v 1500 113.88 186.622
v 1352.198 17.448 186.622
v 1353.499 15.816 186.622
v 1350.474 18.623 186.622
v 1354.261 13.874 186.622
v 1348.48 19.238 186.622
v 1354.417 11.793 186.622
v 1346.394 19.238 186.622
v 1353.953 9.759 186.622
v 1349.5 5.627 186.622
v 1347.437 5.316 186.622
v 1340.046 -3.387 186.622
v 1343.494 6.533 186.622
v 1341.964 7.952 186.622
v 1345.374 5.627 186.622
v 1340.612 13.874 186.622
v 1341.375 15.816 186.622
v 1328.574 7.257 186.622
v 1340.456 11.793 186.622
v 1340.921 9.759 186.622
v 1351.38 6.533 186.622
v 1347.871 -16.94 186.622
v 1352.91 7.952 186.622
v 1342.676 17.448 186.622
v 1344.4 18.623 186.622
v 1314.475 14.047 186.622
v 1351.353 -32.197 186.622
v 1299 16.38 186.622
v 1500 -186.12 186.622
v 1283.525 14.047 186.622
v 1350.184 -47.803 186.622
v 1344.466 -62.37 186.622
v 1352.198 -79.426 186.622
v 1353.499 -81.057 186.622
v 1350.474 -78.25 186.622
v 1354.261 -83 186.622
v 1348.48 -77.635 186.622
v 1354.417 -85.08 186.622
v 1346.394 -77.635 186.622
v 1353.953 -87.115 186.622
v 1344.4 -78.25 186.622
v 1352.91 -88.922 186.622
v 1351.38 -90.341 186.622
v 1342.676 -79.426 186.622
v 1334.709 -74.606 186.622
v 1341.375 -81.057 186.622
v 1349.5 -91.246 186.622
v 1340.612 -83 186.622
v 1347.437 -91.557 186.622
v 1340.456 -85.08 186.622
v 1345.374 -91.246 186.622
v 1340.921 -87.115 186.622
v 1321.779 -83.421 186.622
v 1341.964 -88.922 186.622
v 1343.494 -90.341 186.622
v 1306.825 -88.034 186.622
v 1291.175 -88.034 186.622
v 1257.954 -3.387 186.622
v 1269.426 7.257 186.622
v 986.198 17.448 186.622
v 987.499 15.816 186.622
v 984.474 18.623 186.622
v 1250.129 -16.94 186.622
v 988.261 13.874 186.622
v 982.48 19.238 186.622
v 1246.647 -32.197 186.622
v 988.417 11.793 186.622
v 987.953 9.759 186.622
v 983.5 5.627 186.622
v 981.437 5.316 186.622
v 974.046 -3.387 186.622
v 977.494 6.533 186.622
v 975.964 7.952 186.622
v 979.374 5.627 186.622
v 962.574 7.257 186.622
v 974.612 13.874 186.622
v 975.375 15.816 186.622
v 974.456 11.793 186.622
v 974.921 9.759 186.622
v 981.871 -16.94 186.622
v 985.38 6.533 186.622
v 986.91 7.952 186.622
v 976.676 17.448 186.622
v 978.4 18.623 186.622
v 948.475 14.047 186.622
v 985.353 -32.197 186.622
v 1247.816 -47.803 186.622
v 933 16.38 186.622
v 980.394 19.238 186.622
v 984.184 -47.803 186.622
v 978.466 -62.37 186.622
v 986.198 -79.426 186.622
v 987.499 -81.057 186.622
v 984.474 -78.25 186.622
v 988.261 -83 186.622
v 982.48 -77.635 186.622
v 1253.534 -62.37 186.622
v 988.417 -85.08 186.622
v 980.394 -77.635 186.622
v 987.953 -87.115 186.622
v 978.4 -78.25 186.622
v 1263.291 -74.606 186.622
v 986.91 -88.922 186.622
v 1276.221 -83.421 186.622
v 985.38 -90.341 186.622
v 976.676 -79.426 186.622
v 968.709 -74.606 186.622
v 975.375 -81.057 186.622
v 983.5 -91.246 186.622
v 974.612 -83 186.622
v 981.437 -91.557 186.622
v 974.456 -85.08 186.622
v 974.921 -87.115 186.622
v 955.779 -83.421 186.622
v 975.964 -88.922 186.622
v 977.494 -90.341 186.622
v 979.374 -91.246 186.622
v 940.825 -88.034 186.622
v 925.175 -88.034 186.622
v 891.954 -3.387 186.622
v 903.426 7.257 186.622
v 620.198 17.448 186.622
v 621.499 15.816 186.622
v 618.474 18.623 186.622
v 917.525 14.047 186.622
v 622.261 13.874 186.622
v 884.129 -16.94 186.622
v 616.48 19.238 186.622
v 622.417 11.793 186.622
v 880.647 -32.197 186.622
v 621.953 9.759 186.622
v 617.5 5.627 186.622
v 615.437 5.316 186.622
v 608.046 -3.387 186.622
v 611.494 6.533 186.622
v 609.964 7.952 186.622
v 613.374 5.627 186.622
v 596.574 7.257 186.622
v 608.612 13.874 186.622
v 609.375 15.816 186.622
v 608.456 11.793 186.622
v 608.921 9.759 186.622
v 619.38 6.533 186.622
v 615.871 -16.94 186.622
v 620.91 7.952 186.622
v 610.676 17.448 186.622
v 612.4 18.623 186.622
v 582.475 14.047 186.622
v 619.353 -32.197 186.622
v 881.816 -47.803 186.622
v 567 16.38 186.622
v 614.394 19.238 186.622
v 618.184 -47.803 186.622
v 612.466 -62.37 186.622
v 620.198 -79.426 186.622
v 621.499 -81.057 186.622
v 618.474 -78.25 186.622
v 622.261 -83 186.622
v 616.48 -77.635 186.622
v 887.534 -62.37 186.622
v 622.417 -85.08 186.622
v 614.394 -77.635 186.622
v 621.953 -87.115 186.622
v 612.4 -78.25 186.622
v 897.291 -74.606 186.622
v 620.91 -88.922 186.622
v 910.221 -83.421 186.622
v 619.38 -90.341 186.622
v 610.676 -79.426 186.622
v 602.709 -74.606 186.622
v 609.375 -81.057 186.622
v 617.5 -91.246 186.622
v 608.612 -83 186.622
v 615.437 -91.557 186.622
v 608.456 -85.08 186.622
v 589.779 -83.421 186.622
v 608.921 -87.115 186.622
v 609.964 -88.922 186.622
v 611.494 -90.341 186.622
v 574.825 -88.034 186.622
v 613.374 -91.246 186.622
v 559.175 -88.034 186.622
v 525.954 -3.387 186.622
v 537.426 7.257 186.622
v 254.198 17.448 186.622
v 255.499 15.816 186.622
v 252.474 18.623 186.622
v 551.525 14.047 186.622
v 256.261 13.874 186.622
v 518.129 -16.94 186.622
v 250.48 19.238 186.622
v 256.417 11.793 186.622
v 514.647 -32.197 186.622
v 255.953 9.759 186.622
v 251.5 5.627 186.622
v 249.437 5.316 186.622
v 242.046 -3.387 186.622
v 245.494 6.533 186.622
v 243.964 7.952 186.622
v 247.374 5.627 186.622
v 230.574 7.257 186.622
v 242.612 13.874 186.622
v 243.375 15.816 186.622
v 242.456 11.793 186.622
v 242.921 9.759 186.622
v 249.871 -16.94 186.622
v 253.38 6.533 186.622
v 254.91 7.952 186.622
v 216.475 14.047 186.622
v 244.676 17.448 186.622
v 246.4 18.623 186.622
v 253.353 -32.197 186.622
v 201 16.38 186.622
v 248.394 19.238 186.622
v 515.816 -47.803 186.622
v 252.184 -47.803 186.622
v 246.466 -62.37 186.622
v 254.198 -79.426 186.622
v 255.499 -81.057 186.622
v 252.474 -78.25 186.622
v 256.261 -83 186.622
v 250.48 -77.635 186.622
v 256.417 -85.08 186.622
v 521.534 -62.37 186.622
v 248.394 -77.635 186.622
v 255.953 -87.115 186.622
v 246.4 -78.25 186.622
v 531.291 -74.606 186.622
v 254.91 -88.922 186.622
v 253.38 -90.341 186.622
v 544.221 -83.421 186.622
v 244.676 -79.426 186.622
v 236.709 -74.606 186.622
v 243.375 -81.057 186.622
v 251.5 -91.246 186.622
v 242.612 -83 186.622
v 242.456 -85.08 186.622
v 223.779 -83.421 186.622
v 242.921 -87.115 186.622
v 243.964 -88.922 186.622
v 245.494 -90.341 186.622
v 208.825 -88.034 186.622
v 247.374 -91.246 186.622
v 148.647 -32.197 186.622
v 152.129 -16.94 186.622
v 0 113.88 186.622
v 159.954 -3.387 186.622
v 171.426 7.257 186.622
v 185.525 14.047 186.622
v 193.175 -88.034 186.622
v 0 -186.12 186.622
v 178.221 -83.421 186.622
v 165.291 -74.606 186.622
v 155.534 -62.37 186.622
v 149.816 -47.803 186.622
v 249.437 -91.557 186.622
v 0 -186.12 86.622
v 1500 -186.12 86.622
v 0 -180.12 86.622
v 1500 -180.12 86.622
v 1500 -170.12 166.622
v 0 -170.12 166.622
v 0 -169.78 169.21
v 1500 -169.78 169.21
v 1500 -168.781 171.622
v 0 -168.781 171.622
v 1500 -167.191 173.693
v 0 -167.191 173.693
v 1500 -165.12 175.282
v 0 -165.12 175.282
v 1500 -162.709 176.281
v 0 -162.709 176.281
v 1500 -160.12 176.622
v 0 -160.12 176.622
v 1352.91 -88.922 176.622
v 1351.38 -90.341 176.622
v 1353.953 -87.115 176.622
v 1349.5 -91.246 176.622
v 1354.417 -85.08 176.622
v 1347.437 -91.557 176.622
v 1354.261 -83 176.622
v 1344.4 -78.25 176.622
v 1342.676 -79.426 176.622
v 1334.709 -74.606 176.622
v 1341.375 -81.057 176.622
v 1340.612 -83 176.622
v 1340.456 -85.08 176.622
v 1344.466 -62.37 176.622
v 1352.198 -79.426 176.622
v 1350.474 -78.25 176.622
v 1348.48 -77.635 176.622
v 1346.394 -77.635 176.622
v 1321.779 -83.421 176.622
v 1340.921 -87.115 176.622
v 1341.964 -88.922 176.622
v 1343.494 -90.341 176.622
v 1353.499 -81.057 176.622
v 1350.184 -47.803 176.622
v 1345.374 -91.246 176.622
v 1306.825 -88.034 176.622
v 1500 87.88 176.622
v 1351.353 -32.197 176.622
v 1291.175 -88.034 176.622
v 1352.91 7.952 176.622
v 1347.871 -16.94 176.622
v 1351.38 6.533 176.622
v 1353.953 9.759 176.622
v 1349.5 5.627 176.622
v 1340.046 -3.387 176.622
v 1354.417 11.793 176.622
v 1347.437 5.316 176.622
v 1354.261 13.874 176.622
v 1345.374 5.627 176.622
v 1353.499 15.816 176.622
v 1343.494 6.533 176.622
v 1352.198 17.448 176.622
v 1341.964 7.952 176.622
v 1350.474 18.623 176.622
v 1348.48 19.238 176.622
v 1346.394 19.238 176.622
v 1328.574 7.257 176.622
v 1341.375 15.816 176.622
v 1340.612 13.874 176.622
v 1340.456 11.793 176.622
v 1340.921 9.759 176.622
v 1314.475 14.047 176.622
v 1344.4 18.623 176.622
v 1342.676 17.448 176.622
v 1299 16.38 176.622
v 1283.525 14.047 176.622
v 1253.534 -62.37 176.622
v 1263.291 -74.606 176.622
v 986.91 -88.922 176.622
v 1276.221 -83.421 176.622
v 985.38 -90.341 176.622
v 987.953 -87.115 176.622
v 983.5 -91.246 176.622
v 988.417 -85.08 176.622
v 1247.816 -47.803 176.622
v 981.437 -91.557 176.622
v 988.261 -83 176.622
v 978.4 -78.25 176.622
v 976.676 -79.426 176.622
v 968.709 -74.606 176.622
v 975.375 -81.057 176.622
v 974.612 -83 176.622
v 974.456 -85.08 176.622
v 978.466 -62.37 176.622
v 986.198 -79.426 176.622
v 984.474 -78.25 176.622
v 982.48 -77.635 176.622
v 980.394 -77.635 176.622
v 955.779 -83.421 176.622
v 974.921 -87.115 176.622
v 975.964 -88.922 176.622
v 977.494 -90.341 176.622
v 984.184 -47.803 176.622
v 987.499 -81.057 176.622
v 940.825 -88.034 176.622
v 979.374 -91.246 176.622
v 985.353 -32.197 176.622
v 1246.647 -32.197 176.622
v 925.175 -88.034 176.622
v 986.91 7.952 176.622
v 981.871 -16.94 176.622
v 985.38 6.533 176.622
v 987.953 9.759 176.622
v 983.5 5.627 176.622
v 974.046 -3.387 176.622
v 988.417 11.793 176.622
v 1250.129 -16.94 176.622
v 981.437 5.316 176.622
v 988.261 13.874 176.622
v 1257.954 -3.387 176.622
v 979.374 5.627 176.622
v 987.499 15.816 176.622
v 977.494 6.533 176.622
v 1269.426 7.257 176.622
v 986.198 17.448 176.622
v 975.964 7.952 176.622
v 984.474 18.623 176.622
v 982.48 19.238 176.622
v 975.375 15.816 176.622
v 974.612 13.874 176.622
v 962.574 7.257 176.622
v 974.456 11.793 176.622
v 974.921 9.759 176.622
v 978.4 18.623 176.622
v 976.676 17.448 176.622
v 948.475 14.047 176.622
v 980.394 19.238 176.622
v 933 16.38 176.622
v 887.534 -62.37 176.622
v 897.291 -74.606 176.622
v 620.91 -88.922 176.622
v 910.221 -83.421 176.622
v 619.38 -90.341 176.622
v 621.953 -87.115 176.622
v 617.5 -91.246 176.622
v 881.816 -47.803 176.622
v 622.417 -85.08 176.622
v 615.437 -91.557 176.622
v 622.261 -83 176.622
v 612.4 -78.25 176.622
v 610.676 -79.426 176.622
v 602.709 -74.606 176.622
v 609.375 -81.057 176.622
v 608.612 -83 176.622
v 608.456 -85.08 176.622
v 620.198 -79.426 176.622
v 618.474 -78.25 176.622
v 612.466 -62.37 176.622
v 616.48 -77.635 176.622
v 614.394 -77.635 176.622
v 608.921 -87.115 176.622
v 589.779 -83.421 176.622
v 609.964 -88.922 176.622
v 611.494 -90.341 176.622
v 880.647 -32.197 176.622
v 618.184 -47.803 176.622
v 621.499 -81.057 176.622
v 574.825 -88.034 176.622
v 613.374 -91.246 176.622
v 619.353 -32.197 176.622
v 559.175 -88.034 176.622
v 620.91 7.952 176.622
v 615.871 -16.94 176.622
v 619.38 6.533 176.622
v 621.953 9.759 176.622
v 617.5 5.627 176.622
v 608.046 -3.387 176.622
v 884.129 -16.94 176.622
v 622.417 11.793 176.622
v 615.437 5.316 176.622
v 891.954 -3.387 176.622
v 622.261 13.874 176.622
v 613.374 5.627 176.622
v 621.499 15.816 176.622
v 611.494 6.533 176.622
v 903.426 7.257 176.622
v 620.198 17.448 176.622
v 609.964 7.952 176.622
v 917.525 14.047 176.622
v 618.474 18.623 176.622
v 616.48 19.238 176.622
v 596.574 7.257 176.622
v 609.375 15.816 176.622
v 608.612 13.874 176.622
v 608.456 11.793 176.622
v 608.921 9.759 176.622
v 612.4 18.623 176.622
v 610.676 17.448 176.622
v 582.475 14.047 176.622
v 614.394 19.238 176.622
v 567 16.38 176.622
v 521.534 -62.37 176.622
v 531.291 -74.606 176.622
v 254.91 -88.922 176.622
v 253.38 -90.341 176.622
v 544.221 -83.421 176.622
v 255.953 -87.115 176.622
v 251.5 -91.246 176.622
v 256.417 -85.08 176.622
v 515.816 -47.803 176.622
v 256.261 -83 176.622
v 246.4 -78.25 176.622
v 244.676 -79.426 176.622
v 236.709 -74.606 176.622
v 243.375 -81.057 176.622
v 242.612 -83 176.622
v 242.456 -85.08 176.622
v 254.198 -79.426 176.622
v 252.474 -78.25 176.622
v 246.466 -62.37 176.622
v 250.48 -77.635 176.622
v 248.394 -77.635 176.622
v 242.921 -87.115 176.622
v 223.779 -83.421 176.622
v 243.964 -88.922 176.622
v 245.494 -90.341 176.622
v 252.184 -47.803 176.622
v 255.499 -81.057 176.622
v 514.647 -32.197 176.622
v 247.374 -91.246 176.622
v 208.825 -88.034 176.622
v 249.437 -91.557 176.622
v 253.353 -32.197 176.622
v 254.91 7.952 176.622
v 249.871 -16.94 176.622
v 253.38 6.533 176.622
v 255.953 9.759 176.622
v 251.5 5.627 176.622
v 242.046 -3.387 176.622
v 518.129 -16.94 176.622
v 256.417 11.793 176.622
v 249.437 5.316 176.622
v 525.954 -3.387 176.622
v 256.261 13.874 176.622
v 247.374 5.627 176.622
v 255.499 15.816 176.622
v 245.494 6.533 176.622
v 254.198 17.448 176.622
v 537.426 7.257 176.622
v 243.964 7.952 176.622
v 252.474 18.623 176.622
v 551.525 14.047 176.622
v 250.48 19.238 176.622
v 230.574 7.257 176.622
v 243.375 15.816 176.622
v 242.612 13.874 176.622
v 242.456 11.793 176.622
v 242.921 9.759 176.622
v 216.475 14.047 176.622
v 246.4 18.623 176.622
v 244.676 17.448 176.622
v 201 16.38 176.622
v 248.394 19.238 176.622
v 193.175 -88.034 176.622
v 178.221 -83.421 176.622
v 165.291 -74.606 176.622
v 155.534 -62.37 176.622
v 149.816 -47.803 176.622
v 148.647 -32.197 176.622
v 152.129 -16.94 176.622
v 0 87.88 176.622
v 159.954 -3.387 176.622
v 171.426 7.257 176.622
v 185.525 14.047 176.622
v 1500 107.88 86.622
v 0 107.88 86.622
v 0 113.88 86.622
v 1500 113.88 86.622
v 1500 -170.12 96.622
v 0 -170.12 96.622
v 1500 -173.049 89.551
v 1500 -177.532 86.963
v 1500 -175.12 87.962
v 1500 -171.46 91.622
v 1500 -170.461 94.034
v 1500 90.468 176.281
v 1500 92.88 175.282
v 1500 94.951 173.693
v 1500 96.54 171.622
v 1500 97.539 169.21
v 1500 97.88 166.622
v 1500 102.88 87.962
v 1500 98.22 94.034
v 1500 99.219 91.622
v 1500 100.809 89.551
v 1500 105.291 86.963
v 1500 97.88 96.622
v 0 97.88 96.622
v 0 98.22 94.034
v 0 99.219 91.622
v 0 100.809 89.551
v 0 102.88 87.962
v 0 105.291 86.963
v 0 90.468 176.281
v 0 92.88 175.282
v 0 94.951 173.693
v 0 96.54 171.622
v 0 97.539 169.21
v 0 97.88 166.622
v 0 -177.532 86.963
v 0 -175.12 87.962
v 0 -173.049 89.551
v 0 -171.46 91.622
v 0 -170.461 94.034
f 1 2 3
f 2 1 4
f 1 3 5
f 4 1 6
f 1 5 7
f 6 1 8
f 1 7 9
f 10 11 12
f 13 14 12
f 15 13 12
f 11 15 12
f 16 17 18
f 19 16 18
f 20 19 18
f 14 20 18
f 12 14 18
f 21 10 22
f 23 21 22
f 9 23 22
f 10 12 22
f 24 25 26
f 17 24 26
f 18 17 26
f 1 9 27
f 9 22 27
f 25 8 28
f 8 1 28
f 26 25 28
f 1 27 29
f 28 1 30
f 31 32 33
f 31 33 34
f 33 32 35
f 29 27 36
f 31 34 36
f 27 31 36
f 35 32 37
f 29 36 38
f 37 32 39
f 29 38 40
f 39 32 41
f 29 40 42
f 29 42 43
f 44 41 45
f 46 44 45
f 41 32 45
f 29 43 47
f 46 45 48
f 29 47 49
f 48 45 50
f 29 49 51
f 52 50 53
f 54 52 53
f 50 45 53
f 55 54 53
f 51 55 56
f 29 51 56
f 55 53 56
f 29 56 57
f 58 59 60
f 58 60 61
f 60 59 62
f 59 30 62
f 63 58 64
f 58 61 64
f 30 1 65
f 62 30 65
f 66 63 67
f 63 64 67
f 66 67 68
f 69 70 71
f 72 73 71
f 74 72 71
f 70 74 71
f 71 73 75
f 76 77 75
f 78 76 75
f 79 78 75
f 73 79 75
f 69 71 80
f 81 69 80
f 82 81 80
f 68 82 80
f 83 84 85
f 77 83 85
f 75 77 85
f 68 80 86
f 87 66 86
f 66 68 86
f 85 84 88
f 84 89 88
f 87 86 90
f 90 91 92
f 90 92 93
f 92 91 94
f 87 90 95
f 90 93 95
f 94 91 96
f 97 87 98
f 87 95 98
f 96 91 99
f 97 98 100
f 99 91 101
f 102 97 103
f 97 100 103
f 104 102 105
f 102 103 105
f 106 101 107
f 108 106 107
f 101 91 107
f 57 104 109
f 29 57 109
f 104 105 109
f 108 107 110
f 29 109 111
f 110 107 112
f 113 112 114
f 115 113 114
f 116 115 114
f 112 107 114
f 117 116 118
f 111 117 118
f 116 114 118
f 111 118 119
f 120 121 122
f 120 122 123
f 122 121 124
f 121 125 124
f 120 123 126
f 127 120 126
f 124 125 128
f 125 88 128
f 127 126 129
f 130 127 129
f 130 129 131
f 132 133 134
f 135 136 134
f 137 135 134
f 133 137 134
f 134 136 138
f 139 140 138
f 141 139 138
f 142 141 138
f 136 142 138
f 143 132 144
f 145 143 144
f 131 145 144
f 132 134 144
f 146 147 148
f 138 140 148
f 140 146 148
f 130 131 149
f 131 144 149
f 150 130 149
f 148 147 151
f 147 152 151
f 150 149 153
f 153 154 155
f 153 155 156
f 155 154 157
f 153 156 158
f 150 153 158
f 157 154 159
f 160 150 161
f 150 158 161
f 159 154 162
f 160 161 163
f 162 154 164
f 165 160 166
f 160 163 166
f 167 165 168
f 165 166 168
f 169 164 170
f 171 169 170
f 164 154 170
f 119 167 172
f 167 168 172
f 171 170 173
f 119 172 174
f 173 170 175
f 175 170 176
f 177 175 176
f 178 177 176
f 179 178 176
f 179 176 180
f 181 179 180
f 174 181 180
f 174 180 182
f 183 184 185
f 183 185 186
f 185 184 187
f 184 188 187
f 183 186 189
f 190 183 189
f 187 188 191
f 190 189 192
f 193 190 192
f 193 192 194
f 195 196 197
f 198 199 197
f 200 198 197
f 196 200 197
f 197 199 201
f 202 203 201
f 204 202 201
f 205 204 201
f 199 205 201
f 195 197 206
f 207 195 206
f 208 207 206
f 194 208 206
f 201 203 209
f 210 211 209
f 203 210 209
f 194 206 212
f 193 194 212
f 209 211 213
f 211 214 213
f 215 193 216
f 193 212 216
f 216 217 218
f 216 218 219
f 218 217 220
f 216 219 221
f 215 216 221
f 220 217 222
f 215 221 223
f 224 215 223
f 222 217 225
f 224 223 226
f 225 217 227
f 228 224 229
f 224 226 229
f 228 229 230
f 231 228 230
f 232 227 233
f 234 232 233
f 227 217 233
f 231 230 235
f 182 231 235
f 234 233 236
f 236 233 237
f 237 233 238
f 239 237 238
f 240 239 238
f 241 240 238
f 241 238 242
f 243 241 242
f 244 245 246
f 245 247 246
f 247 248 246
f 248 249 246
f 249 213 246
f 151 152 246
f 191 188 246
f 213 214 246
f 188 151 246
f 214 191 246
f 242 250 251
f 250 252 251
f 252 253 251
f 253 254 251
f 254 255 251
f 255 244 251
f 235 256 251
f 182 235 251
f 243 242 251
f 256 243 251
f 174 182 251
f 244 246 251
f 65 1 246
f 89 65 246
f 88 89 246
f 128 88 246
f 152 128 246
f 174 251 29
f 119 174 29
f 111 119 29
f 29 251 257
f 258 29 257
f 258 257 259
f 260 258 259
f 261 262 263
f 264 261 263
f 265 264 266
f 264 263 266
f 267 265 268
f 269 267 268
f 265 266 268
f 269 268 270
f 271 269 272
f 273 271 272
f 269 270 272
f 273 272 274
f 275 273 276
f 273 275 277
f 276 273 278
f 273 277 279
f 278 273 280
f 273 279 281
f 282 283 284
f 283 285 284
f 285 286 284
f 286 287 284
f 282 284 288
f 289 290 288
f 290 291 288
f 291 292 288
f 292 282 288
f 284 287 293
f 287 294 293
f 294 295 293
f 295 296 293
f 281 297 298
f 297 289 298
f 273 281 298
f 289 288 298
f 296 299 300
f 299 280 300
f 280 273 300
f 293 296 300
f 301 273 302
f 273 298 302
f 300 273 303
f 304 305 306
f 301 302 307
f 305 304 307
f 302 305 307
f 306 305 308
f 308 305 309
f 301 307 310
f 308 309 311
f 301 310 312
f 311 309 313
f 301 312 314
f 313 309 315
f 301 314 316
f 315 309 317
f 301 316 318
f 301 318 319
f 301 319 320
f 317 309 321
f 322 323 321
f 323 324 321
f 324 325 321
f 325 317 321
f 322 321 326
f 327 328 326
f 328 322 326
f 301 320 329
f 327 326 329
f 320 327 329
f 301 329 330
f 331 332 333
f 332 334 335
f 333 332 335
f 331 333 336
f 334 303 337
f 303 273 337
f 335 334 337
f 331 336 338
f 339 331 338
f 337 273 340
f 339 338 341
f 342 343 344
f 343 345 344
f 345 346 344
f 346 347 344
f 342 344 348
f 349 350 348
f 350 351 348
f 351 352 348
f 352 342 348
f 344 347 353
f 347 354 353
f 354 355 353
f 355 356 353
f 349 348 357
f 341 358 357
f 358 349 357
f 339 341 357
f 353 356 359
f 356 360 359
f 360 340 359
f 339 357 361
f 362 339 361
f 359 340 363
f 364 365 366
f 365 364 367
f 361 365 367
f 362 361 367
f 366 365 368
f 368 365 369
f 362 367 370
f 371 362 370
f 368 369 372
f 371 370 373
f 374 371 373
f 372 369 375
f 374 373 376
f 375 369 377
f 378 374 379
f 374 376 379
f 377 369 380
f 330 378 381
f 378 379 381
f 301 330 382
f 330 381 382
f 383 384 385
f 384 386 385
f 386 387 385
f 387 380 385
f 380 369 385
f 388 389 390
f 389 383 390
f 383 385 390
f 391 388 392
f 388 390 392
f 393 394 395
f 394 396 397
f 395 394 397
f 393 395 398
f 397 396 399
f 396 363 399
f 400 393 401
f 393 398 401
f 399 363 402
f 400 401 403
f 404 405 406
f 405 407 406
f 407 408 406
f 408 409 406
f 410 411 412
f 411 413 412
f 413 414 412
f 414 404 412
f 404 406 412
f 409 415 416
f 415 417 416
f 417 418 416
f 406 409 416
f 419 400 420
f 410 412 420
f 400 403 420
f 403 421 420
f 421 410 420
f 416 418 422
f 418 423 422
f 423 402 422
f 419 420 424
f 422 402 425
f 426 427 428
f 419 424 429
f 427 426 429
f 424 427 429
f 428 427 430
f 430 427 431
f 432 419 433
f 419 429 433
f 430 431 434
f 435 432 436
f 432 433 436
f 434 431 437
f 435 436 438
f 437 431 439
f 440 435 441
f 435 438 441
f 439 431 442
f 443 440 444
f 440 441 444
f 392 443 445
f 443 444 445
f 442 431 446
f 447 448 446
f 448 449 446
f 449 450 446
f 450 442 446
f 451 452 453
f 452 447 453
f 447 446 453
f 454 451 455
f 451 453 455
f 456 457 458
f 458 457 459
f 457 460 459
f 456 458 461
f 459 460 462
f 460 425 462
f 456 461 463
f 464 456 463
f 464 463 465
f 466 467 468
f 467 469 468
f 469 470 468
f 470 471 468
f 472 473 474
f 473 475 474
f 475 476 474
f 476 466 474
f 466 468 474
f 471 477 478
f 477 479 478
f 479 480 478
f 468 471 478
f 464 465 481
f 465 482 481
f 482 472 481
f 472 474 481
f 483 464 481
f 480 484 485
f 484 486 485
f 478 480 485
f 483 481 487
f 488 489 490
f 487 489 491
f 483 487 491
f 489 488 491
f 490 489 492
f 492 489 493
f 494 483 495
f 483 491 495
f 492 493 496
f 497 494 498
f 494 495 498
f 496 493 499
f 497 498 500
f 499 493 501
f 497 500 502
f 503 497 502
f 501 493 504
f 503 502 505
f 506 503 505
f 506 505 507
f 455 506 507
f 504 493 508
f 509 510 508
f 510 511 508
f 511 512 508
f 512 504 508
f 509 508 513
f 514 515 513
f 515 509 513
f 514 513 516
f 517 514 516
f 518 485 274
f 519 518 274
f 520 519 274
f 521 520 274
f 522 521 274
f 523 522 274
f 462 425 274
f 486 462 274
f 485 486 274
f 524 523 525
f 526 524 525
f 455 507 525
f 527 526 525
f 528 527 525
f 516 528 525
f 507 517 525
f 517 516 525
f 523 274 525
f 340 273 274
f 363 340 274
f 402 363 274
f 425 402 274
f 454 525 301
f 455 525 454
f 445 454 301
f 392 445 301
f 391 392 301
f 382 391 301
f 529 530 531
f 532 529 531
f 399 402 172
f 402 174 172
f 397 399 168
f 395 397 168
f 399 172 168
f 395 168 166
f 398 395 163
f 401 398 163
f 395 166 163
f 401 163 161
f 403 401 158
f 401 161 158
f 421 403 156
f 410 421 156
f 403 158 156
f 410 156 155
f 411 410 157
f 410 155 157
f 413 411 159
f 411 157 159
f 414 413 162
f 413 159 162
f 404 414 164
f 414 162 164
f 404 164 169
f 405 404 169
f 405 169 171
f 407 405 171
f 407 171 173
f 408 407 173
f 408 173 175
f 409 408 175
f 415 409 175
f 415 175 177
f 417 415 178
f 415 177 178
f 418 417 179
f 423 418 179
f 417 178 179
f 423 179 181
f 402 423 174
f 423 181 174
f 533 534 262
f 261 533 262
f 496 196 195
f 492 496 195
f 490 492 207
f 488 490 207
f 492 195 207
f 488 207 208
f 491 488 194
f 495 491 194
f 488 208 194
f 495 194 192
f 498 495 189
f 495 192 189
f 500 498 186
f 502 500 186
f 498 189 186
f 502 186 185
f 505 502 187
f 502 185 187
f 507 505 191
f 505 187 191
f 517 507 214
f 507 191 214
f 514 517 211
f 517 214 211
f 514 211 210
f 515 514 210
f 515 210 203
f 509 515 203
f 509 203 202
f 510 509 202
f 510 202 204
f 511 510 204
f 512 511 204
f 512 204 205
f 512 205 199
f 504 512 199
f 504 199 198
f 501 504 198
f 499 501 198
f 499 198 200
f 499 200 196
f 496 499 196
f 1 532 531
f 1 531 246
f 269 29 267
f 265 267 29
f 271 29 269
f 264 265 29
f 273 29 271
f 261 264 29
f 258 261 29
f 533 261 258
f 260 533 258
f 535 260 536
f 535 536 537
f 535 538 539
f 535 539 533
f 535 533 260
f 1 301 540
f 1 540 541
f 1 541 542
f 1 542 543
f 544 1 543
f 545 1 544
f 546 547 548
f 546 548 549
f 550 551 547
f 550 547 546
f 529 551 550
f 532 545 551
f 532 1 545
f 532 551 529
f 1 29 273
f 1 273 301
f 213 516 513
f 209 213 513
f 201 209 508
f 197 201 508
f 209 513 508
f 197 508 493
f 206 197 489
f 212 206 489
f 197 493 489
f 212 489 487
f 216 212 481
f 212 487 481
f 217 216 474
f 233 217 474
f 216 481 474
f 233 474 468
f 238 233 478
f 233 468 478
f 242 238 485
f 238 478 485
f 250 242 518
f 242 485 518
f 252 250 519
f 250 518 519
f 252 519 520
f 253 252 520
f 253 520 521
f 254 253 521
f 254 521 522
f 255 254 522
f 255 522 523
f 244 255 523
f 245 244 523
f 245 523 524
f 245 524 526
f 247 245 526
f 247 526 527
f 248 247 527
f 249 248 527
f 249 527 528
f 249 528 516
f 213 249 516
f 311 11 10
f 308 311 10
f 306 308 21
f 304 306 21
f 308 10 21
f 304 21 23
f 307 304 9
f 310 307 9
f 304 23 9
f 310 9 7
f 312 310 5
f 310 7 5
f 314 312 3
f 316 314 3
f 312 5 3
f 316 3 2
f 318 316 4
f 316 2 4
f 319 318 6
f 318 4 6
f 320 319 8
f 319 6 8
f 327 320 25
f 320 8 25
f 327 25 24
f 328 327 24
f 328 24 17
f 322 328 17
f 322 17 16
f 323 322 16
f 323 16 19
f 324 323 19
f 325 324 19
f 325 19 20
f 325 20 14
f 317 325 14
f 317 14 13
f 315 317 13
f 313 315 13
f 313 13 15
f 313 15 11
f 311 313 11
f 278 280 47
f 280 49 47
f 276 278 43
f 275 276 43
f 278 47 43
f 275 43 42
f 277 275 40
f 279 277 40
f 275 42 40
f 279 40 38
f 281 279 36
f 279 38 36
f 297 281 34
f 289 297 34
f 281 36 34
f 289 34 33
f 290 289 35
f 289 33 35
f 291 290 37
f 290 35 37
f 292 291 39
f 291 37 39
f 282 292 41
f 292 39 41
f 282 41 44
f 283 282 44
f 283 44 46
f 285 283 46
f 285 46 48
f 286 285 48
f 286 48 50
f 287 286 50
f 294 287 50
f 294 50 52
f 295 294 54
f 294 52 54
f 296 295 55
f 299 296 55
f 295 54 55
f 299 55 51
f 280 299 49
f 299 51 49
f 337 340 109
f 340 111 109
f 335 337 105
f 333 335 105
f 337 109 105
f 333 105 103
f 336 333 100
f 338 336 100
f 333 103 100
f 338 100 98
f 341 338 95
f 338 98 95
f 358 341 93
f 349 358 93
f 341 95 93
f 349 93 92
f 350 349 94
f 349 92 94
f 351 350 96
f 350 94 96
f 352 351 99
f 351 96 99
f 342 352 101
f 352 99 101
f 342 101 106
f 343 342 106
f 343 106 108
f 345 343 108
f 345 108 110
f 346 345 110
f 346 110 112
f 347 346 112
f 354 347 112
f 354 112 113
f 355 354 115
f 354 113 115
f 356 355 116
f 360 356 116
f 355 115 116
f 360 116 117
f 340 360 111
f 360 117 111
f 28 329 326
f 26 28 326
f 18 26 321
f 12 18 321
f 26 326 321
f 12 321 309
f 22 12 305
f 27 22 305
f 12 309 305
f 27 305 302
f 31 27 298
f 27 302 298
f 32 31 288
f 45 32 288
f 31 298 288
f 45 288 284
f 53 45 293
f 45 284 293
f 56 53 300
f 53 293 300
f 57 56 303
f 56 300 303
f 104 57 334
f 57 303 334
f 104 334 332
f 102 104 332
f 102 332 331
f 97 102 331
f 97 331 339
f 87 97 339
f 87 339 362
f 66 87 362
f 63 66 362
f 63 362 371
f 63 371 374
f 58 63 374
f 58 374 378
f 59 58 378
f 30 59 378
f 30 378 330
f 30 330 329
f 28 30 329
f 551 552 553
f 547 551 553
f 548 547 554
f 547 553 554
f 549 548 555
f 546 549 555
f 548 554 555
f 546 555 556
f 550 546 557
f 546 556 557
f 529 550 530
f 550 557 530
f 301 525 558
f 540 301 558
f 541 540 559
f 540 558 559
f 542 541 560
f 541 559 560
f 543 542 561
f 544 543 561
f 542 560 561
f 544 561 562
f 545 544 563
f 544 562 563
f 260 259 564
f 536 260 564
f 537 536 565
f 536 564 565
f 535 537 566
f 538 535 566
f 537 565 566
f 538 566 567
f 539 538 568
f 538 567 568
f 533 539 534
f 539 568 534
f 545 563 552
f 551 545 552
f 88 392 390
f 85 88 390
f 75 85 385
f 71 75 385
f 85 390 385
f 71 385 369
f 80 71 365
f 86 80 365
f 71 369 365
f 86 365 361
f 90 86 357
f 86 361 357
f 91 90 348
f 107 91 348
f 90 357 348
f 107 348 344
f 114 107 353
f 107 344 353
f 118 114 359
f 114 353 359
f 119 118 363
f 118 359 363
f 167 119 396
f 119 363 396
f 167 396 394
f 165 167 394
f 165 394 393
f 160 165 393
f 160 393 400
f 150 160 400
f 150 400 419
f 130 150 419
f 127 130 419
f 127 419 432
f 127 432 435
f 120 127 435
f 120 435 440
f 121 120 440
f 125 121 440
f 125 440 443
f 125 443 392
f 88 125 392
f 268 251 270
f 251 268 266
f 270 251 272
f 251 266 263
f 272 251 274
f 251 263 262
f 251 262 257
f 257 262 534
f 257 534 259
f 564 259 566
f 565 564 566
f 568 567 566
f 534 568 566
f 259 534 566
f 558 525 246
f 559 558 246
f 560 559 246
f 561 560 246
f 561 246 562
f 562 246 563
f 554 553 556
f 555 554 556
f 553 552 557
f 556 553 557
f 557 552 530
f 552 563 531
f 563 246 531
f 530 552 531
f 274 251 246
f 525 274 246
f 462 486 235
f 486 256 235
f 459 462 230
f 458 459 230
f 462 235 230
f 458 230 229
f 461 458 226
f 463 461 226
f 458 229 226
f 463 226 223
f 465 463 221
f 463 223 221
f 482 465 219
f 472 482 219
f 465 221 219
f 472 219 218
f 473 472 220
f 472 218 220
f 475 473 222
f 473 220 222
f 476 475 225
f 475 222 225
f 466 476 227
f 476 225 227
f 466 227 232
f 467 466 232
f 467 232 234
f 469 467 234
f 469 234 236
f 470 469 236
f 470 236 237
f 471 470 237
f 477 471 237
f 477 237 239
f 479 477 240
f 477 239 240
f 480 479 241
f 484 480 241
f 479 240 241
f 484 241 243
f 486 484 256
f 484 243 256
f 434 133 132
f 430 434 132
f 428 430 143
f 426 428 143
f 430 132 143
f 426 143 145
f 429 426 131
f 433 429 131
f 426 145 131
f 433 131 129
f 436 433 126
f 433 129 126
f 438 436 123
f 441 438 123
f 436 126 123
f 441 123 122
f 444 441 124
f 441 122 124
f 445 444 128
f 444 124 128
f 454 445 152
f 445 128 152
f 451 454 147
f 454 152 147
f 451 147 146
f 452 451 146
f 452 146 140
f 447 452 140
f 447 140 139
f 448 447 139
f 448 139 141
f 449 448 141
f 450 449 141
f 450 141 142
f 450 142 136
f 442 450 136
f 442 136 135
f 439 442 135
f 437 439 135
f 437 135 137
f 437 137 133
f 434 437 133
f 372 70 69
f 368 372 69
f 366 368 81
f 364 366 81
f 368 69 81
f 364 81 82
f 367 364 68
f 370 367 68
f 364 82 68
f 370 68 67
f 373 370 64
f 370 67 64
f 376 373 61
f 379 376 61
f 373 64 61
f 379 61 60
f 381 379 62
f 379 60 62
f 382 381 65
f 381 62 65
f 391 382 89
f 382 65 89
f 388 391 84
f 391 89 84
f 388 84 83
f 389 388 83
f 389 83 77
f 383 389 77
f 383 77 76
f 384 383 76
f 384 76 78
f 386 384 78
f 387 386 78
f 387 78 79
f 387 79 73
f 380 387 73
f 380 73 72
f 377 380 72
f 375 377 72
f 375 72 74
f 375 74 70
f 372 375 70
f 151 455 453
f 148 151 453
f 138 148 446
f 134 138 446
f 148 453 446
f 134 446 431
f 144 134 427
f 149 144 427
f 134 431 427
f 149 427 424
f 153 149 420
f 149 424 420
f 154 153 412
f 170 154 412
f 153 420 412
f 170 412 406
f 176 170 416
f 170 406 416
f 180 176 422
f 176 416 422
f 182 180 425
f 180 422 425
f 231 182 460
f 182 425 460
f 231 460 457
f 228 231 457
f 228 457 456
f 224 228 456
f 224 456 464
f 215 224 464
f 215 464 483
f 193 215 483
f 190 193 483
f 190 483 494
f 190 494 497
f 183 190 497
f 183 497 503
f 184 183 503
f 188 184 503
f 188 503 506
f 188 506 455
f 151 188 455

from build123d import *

# Parameters (mm, degrees)
BOSS_EXTRUDE1_DEPTH = 1500
SKETCH5_R           = 52.5
CUT_EXTRUDE3_DEPTH  = 30
LPATTERN2_COUNT     = 4
LPATTERN2_PITCH     = 366
SKETCH6_R           = 7
CUT_EXTRUDE4_DEPTH  = 1515.807183702
LPATTERN3_COUNT     = 4
LPATTERN3_PITCH     = 366


with BuildPart() as part:
    # Sketch1 → Boss-Extrude1 (new body)
    with BuildSketch(Plane(origin=(0, 0, 0), x_dir=(0, 0, -1), z_dir=(1, 0, 0))):
        with BuildLine():
            Line((-86.622073579, 113.879598662), (-186.622073579, 113.879598662))
            Line((-186.622073579, 113.879598662), (-186.622073579, -186.120401338))
            Line((-186.622073579, -186.120401338), (-86.622073579, -186.120401338))
            Line((-86.622073579, -186.120401338), (-86.622073579, -180.120401338))
            ThreePointArc((-86.622073579, -180.120401338), (-89.551005767, -173.049333526), (-96.622073579, -170.120401338))
            Line((-96.622073579, -170.120401338), (-166.622073579, -170.120401338))
            ThreePointArc((-166.622073579, -170.120401338), (-173.69314139, -167.19146915), (-176.622073579, -160.120401338))
            Line((-176.622073579, -160.120401338), (-176.622073579, 87.879598662))
            ThreePointArc((-176.622073579, 87.879598662), (-173.69314139, 94.950666474), (-166.622073579, 97.879598662))
            Line((-166.622073579, 97.879598662), (-96.622073579, 97.879598662))
            ThreePointArc((-96.622073579, 97.879598662), (-89.551005767, 100.80853085), (-86.622073579, 107.879598662))
            Line((-86.622073579, 107.879598662), (-86.622073579, 113.879598662))
        make_face()
    extrude(amount=BOSS_EXTRUDE1_DEPTH)

    # Sketch5 → Cut-Extrude3 (cut)
    with BuildSketch(Plane(origin=(0, 0, 176.622073579), x_dir=(-1, 0, 0), z_dir=(0, 0, -1))):
        with Locations(Location((-1299, -36.120401338, 0), (0, 0, 90))):
            Circle(SKETCH5_R)
    cut_extrude3 = extrude(amount=-CUT_EXTRUDE3_DEPTH, mode=Mode.SUBTRACT)

    # LPattern2: Cut-Extrude3 ×4
    with Locations(*[(-i * LPATTERN2_PITCH, 0, 0) for i in range(1, LPATTERN2_COUNT)]):
        add(cut_extrude3, mode=Mode.SUBTRACT)

    # Sketch6 → Cut-Extrude4 (cut, symmetric)
    with BuildSketch(Plane.XY.offset(186.622073579)):
        with Locations(Location((1347.436814511, 12.316413173, 0), (0, 0, 270))):
            Circle(SKETCH6_R)
        with Locations(Location((1347.436814511, -84.557215849, 0), (0, 0, 270))):
            Circle(SKETCH6_R)
    cut_extrude4 = extrude(amount=CUT_EXTRUDE4_DEPTH, both=True, mode=Mode.SUBTRACT)

    # LPattern3: Cut-Extrude4 ×4
    with Locations(*[(-i * LPATTERN3_PITCH, 0, 0) for i in range(1, LPATTERN3_COUNT)]):
        add(cut_extrude4, mode=Mode.SUBTRACT)


solid = part.part
